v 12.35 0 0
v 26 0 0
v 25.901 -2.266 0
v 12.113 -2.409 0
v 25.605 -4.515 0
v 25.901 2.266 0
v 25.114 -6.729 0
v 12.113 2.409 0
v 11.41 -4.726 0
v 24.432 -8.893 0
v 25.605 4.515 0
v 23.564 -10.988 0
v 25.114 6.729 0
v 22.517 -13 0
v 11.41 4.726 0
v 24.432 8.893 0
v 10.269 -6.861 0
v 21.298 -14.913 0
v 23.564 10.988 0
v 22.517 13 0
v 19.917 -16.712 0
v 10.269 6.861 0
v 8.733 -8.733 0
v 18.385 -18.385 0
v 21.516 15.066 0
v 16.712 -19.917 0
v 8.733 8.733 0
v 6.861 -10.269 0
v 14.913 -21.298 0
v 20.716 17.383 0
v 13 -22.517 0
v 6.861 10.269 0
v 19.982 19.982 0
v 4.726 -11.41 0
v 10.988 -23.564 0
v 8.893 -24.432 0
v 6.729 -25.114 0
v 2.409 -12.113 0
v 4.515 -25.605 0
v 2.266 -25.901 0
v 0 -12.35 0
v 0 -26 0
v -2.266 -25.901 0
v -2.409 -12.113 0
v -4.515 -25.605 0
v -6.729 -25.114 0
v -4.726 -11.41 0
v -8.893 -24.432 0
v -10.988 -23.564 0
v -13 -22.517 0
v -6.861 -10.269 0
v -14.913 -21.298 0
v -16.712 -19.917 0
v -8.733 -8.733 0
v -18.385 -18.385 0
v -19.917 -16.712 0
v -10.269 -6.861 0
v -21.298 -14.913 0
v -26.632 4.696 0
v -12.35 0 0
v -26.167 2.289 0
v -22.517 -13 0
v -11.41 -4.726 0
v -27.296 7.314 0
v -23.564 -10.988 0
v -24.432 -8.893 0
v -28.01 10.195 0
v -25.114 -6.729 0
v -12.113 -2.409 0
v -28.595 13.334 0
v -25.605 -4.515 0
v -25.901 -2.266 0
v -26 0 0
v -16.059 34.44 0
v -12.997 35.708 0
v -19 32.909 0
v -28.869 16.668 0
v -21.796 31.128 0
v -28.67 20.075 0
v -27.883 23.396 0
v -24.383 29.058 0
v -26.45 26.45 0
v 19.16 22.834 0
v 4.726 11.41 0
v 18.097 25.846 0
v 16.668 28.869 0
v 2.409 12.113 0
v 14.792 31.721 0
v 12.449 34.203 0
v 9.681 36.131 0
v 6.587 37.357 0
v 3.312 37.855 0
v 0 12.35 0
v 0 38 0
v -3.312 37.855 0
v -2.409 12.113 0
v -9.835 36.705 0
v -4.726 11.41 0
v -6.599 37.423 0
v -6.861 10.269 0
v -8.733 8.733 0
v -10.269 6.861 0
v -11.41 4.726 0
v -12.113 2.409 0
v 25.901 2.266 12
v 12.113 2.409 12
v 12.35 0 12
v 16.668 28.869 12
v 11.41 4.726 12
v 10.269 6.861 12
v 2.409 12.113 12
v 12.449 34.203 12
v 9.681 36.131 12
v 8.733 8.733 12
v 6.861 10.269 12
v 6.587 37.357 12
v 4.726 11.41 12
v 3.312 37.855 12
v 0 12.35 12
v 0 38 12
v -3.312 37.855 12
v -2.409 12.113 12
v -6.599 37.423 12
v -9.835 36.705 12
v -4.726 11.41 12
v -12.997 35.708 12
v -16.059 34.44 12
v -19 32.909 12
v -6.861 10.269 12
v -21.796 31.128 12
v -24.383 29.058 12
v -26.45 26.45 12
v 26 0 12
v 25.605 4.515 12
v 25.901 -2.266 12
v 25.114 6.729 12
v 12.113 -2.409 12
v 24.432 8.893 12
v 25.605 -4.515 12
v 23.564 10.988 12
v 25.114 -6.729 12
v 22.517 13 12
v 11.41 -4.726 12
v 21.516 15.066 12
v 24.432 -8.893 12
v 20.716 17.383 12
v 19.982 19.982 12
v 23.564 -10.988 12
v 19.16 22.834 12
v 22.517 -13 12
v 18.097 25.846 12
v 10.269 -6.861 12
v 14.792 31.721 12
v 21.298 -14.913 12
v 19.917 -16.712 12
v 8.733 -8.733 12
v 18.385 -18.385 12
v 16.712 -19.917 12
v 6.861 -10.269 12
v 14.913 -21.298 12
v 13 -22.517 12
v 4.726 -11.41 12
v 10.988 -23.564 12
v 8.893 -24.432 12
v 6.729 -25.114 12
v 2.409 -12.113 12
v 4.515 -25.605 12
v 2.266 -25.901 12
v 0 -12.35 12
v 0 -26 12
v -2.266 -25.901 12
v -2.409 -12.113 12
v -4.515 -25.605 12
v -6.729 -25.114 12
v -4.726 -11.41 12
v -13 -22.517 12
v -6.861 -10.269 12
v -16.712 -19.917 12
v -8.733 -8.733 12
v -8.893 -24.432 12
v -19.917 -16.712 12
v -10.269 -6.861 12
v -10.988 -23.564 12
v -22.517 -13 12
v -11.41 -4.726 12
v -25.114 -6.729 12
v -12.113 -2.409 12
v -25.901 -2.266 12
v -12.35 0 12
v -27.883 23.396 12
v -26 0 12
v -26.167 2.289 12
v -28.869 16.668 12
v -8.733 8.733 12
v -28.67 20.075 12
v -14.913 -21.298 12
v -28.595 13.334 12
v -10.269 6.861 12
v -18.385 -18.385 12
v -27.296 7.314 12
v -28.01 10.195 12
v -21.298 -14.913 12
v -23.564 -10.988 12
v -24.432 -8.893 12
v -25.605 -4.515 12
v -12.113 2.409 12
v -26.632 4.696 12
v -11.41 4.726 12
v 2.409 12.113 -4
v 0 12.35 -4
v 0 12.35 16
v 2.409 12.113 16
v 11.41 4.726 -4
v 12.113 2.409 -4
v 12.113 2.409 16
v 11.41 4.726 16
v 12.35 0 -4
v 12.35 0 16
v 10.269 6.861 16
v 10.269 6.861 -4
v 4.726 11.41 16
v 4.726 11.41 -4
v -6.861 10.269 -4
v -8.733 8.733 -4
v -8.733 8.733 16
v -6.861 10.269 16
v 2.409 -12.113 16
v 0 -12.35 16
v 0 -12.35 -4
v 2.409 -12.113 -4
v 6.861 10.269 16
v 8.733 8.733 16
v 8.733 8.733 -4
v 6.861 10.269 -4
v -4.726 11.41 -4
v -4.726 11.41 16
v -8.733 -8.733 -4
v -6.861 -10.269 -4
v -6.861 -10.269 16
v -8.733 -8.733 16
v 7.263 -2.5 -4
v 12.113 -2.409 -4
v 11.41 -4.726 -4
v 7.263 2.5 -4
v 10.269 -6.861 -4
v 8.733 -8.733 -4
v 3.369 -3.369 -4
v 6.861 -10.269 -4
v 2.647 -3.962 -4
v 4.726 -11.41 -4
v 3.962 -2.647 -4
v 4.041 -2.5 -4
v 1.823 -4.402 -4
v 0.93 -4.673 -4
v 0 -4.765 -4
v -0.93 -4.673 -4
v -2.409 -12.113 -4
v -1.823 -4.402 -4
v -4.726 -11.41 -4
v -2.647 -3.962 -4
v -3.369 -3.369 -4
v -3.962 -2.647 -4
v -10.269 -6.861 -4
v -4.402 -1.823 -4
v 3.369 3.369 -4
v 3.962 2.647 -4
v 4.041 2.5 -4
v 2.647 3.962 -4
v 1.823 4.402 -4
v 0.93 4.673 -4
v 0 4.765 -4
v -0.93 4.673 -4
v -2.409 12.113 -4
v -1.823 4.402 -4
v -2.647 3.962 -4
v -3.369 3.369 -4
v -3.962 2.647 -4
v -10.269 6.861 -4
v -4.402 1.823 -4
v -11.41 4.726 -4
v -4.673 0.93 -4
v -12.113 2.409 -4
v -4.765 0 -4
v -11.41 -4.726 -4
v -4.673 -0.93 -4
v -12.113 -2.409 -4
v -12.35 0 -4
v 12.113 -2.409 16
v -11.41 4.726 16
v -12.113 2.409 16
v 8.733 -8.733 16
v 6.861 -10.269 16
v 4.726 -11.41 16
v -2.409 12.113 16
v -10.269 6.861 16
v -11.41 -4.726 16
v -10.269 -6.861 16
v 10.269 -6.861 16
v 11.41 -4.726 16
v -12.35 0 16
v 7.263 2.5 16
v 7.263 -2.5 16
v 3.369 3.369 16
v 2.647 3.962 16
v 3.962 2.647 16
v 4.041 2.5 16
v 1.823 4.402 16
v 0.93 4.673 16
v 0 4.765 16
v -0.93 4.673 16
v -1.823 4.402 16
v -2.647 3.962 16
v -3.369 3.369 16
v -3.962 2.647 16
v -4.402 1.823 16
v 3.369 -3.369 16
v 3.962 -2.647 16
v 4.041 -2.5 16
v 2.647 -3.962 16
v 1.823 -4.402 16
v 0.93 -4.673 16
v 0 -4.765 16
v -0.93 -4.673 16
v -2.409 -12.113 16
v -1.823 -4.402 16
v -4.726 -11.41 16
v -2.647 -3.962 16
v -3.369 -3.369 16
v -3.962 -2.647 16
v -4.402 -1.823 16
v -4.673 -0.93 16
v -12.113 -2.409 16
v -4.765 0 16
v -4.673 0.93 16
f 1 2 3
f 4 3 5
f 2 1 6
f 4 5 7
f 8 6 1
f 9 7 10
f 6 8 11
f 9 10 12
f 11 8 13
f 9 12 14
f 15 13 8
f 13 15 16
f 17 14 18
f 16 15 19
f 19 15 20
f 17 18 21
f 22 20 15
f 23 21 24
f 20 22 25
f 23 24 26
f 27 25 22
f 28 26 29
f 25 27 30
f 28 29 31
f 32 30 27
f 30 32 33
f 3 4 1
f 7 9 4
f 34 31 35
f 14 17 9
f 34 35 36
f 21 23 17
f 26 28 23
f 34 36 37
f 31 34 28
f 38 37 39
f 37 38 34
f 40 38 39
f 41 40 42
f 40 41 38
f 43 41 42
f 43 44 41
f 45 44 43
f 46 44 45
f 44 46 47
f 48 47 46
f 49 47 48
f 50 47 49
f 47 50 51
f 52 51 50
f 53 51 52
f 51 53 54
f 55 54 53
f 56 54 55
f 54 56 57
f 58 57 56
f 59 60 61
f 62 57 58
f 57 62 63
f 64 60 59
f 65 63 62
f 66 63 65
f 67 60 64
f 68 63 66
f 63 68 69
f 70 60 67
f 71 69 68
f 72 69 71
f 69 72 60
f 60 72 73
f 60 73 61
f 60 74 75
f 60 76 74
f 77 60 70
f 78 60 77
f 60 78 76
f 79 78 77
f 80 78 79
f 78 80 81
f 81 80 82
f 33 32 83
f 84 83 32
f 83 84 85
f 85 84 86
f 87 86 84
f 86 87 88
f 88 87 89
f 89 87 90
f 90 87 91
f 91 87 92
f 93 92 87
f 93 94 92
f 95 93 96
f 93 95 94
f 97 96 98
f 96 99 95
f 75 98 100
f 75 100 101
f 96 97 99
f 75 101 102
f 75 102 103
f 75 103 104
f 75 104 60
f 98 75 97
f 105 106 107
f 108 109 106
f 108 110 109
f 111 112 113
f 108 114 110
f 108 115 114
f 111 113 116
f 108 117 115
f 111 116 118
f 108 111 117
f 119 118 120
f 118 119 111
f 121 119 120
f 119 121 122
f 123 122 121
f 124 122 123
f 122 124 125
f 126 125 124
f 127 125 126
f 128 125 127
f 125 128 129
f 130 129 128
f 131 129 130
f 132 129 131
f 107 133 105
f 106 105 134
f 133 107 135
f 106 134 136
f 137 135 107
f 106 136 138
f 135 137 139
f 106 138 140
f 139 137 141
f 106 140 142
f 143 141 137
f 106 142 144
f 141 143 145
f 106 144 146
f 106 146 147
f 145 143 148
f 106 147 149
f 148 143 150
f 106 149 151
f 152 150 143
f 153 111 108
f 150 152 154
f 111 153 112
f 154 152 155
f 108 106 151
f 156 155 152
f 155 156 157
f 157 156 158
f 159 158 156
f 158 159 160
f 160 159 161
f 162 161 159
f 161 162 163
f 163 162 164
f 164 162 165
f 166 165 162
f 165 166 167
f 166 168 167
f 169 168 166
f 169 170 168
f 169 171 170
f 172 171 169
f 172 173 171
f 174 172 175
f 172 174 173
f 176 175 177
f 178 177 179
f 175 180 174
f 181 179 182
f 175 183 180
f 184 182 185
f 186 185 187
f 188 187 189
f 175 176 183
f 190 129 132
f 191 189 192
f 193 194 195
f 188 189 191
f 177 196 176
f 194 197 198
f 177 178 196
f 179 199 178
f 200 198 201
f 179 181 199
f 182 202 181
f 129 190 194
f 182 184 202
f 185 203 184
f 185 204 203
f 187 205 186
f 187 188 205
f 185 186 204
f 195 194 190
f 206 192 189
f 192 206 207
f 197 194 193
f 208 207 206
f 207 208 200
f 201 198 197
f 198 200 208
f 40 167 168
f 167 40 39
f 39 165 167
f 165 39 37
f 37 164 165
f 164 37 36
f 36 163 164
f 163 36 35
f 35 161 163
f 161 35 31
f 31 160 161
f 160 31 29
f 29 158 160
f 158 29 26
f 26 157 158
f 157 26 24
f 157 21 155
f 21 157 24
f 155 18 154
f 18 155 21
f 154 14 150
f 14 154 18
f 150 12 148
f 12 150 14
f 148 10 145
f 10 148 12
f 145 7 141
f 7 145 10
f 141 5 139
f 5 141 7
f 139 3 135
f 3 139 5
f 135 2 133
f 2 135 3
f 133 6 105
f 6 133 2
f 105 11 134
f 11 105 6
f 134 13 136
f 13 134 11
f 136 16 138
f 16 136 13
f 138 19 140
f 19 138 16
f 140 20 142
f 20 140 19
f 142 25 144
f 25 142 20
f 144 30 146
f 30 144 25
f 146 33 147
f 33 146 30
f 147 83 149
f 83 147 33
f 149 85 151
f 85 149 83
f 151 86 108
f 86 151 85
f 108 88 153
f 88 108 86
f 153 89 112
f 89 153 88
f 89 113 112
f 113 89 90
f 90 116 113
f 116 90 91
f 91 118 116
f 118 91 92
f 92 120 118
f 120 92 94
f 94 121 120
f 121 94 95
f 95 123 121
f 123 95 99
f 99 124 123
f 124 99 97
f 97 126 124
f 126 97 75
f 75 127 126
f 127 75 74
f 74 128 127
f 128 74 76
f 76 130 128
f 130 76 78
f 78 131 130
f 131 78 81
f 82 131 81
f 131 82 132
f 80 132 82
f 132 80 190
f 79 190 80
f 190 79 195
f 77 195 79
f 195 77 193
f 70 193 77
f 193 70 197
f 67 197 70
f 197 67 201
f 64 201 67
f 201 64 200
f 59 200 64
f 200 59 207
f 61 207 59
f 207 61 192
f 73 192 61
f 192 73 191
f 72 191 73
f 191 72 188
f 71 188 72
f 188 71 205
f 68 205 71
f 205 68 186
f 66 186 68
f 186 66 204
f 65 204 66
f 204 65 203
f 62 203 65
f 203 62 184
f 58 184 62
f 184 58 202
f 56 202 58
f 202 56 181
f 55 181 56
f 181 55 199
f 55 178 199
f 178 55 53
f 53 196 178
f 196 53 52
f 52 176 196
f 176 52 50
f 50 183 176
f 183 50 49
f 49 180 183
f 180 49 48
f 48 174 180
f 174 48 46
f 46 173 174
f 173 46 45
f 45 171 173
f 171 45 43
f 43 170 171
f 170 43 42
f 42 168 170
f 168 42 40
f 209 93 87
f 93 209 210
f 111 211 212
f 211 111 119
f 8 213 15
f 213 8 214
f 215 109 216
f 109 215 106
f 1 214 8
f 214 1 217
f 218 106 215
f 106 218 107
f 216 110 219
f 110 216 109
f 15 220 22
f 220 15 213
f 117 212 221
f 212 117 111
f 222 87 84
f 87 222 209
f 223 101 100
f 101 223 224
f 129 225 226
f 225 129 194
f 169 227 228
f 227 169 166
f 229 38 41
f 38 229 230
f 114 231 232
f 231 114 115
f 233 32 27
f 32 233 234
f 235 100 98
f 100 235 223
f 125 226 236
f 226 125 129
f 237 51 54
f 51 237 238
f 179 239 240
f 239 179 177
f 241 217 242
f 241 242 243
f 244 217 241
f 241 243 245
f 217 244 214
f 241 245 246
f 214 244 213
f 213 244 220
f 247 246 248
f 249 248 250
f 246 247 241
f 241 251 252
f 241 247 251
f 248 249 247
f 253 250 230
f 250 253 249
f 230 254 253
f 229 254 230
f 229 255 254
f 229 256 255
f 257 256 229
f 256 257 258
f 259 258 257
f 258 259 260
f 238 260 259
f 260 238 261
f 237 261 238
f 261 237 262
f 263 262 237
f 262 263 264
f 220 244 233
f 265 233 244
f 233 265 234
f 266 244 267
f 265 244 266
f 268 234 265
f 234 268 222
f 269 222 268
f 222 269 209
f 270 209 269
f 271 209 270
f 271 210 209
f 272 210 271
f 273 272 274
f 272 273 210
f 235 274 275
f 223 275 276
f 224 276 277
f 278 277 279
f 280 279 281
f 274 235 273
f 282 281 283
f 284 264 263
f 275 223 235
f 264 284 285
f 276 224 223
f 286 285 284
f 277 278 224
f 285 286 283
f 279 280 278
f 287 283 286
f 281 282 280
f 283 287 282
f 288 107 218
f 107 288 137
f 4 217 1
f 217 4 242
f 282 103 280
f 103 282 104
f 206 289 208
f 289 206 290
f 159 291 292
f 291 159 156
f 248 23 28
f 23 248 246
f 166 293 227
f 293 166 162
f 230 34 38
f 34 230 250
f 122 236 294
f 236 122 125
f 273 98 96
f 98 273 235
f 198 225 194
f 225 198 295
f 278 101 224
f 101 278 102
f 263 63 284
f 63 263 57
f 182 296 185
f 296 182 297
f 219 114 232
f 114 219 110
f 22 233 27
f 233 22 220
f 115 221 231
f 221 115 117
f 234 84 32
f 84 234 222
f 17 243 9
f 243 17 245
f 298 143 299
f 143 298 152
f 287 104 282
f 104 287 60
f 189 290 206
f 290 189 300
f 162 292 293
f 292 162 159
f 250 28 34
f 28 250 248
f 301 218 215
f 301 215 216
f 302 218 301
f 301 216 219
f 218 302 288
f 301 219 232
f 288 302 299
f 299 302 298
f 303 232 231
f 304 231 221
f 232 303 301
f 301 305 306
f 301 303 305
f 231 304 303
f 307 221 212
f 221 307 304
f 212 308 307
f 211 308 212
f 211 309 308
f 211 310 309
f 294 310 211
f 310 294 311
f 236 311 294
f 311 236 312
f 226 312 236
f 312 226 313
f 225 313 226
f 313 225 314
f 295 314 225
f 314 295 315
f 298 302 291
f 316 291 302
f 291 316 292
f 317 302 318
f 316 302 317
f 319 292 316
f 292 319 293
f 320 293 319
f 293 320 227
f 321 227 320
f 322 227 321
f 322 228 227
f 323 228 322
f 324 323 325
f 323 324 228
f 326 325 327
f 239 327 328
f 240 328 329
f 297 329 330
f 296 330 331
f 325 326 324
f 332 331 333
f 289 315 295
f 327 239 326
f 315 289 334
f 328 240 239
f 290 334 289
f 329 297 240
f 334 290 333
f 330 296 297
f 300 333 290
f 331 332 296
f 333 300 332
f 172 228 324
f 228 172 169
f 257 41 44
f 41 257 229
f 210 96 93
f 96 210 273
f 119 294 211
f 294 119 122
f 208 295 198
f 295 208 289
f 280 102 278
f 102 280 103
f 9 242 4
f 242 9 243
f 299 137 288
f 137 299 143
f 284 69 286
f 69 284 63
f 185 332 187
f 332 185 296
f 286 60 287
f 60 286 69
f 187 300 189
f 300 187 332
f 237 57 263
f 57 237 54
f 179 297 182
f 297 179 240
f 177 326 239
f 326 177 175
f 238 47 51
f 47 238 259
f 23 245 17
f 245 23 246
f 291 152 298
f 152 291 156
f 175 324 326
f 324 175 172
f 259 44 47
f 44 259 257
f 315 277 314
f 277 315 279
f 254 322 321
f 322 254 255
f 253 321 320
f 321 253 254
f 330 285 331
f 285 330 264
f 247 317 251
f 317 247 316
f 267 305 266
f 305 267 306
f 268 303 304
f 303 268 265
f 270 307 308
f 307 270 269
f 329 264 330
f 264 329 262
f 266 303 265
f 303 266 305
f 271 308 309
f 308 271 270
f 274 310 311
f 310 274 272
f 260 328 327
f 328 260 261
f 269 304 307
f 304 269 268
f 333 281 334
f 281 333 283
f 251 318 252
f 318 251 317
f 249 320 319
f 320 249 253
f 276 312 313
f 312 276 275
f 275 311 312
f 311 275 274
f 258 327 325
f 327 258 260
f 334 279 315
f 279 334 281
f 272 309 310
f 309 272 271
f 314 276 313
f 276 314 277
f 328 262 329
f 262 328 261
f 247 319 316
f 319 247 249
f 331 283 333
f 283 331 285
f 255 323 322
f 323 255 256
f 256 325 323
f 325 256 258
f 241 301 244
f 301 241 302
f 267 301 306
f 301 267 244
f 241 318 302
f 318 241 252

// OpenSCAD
$fn = 32;

// ----------------------------------------------------------------------
// Cam: base radius 26 mm with a 12 mm lift over 150 degrees
// ----------------------------------------------------------------------

// --- parameters (mm) ---
base_r = 26;              // base radius
lift = 12;                // lift height above the base radius
lift_span = 150;          // angular width of the lift
lift_start = 30;          // angle where the lift starts
cam_t = 12;               // cam plate thickness
hub_d = 24.7;             // hub diameter
hub_h = 20;               // hub height
bore_d = 9.53;            // bore
key_w = 5;                // keyway width
key_depth = 2.5;          // keyway depth

cam_profile = [[26, 0], [25.901, 2.266], [25.605, 4.515], [25.114, 6.729], [24.432, 8.893], [23.564, 10.988], [22.517, 13], [21.516, 15.066], [20.716, 17.383], [19.982, 19.982], [19.16, 22.834], [18.097, 25.846], [16.668, 28.869], [14.792, 31.721], [12.449, 34.203], [9.681, 36.131], [6.587, 37.357], [3.312, 37.855], [0, 38], [-3.312, 37.855], [-6.599, 37.423], [-9.835, 36.705], [-12.997, 35.708], [-16.059, 34.44], [-19, 32.909], [-21.796, 31.128], [-24.383, 29.058], [-26.45, 26.45], [-27.883, 23.396], [-28.67, 20.075], [-28.869, 16.668], [-28.595, 13.334], [-28.01, 10.195], [-27.296, 7.314], [-26.632, 4.696], [-26.167, 2.289], [-26, 0], [-25.901, -2.266], [-25.605, -4.515], [-25.114, -6.729], [-24.432, -8.893], [-23.564, -10.988], [-22.517, -13], [-21.298, -14.913], [-19.917, -16.712], [-18.385, -18.385], [-16.712, -19.917], [-14.913, -21.298], [-13, -22.517], [-10.988, -23.564], [-8.893, -24.432], [-6.729, -25.114], [-4.515, -25.605], [-2.266, -25.901], [0, -26], [2.266, -25.901], [4.515, -25.605], [6.729, -25.114], [8.893, -24.432], [10.988, -23.564], [13, -22.517], [14.913, -21.298], [16.712, -19.917], [18.385, -18.385], [19.917, -16.712], [21.298, -14.913], [22.517, -13], [23.564, -10.988], [24.432, -8.893], [25.114, -6.729], [25.605, -4.515], [25.901, -2.266]];

difference() {
  union() {
    linear_extrude(height = cam_t) polygon(cam_profile);
    /* hub, proud of the cam plate on both sides */
    translate([0, 0, -4]) cylinder(h = hub_h, d = hub_d);
  }
  /* bore through the hub, 2.5 mm clear on both faces */
  translate([0, 0, -6.5]) cylinder(h = hub_h + 5, d = bore_d);
  /* keyway, milled through the whole hub */
  translate([2.263, -2.5, -6.5]) cube([5, 5, 25]);
}
